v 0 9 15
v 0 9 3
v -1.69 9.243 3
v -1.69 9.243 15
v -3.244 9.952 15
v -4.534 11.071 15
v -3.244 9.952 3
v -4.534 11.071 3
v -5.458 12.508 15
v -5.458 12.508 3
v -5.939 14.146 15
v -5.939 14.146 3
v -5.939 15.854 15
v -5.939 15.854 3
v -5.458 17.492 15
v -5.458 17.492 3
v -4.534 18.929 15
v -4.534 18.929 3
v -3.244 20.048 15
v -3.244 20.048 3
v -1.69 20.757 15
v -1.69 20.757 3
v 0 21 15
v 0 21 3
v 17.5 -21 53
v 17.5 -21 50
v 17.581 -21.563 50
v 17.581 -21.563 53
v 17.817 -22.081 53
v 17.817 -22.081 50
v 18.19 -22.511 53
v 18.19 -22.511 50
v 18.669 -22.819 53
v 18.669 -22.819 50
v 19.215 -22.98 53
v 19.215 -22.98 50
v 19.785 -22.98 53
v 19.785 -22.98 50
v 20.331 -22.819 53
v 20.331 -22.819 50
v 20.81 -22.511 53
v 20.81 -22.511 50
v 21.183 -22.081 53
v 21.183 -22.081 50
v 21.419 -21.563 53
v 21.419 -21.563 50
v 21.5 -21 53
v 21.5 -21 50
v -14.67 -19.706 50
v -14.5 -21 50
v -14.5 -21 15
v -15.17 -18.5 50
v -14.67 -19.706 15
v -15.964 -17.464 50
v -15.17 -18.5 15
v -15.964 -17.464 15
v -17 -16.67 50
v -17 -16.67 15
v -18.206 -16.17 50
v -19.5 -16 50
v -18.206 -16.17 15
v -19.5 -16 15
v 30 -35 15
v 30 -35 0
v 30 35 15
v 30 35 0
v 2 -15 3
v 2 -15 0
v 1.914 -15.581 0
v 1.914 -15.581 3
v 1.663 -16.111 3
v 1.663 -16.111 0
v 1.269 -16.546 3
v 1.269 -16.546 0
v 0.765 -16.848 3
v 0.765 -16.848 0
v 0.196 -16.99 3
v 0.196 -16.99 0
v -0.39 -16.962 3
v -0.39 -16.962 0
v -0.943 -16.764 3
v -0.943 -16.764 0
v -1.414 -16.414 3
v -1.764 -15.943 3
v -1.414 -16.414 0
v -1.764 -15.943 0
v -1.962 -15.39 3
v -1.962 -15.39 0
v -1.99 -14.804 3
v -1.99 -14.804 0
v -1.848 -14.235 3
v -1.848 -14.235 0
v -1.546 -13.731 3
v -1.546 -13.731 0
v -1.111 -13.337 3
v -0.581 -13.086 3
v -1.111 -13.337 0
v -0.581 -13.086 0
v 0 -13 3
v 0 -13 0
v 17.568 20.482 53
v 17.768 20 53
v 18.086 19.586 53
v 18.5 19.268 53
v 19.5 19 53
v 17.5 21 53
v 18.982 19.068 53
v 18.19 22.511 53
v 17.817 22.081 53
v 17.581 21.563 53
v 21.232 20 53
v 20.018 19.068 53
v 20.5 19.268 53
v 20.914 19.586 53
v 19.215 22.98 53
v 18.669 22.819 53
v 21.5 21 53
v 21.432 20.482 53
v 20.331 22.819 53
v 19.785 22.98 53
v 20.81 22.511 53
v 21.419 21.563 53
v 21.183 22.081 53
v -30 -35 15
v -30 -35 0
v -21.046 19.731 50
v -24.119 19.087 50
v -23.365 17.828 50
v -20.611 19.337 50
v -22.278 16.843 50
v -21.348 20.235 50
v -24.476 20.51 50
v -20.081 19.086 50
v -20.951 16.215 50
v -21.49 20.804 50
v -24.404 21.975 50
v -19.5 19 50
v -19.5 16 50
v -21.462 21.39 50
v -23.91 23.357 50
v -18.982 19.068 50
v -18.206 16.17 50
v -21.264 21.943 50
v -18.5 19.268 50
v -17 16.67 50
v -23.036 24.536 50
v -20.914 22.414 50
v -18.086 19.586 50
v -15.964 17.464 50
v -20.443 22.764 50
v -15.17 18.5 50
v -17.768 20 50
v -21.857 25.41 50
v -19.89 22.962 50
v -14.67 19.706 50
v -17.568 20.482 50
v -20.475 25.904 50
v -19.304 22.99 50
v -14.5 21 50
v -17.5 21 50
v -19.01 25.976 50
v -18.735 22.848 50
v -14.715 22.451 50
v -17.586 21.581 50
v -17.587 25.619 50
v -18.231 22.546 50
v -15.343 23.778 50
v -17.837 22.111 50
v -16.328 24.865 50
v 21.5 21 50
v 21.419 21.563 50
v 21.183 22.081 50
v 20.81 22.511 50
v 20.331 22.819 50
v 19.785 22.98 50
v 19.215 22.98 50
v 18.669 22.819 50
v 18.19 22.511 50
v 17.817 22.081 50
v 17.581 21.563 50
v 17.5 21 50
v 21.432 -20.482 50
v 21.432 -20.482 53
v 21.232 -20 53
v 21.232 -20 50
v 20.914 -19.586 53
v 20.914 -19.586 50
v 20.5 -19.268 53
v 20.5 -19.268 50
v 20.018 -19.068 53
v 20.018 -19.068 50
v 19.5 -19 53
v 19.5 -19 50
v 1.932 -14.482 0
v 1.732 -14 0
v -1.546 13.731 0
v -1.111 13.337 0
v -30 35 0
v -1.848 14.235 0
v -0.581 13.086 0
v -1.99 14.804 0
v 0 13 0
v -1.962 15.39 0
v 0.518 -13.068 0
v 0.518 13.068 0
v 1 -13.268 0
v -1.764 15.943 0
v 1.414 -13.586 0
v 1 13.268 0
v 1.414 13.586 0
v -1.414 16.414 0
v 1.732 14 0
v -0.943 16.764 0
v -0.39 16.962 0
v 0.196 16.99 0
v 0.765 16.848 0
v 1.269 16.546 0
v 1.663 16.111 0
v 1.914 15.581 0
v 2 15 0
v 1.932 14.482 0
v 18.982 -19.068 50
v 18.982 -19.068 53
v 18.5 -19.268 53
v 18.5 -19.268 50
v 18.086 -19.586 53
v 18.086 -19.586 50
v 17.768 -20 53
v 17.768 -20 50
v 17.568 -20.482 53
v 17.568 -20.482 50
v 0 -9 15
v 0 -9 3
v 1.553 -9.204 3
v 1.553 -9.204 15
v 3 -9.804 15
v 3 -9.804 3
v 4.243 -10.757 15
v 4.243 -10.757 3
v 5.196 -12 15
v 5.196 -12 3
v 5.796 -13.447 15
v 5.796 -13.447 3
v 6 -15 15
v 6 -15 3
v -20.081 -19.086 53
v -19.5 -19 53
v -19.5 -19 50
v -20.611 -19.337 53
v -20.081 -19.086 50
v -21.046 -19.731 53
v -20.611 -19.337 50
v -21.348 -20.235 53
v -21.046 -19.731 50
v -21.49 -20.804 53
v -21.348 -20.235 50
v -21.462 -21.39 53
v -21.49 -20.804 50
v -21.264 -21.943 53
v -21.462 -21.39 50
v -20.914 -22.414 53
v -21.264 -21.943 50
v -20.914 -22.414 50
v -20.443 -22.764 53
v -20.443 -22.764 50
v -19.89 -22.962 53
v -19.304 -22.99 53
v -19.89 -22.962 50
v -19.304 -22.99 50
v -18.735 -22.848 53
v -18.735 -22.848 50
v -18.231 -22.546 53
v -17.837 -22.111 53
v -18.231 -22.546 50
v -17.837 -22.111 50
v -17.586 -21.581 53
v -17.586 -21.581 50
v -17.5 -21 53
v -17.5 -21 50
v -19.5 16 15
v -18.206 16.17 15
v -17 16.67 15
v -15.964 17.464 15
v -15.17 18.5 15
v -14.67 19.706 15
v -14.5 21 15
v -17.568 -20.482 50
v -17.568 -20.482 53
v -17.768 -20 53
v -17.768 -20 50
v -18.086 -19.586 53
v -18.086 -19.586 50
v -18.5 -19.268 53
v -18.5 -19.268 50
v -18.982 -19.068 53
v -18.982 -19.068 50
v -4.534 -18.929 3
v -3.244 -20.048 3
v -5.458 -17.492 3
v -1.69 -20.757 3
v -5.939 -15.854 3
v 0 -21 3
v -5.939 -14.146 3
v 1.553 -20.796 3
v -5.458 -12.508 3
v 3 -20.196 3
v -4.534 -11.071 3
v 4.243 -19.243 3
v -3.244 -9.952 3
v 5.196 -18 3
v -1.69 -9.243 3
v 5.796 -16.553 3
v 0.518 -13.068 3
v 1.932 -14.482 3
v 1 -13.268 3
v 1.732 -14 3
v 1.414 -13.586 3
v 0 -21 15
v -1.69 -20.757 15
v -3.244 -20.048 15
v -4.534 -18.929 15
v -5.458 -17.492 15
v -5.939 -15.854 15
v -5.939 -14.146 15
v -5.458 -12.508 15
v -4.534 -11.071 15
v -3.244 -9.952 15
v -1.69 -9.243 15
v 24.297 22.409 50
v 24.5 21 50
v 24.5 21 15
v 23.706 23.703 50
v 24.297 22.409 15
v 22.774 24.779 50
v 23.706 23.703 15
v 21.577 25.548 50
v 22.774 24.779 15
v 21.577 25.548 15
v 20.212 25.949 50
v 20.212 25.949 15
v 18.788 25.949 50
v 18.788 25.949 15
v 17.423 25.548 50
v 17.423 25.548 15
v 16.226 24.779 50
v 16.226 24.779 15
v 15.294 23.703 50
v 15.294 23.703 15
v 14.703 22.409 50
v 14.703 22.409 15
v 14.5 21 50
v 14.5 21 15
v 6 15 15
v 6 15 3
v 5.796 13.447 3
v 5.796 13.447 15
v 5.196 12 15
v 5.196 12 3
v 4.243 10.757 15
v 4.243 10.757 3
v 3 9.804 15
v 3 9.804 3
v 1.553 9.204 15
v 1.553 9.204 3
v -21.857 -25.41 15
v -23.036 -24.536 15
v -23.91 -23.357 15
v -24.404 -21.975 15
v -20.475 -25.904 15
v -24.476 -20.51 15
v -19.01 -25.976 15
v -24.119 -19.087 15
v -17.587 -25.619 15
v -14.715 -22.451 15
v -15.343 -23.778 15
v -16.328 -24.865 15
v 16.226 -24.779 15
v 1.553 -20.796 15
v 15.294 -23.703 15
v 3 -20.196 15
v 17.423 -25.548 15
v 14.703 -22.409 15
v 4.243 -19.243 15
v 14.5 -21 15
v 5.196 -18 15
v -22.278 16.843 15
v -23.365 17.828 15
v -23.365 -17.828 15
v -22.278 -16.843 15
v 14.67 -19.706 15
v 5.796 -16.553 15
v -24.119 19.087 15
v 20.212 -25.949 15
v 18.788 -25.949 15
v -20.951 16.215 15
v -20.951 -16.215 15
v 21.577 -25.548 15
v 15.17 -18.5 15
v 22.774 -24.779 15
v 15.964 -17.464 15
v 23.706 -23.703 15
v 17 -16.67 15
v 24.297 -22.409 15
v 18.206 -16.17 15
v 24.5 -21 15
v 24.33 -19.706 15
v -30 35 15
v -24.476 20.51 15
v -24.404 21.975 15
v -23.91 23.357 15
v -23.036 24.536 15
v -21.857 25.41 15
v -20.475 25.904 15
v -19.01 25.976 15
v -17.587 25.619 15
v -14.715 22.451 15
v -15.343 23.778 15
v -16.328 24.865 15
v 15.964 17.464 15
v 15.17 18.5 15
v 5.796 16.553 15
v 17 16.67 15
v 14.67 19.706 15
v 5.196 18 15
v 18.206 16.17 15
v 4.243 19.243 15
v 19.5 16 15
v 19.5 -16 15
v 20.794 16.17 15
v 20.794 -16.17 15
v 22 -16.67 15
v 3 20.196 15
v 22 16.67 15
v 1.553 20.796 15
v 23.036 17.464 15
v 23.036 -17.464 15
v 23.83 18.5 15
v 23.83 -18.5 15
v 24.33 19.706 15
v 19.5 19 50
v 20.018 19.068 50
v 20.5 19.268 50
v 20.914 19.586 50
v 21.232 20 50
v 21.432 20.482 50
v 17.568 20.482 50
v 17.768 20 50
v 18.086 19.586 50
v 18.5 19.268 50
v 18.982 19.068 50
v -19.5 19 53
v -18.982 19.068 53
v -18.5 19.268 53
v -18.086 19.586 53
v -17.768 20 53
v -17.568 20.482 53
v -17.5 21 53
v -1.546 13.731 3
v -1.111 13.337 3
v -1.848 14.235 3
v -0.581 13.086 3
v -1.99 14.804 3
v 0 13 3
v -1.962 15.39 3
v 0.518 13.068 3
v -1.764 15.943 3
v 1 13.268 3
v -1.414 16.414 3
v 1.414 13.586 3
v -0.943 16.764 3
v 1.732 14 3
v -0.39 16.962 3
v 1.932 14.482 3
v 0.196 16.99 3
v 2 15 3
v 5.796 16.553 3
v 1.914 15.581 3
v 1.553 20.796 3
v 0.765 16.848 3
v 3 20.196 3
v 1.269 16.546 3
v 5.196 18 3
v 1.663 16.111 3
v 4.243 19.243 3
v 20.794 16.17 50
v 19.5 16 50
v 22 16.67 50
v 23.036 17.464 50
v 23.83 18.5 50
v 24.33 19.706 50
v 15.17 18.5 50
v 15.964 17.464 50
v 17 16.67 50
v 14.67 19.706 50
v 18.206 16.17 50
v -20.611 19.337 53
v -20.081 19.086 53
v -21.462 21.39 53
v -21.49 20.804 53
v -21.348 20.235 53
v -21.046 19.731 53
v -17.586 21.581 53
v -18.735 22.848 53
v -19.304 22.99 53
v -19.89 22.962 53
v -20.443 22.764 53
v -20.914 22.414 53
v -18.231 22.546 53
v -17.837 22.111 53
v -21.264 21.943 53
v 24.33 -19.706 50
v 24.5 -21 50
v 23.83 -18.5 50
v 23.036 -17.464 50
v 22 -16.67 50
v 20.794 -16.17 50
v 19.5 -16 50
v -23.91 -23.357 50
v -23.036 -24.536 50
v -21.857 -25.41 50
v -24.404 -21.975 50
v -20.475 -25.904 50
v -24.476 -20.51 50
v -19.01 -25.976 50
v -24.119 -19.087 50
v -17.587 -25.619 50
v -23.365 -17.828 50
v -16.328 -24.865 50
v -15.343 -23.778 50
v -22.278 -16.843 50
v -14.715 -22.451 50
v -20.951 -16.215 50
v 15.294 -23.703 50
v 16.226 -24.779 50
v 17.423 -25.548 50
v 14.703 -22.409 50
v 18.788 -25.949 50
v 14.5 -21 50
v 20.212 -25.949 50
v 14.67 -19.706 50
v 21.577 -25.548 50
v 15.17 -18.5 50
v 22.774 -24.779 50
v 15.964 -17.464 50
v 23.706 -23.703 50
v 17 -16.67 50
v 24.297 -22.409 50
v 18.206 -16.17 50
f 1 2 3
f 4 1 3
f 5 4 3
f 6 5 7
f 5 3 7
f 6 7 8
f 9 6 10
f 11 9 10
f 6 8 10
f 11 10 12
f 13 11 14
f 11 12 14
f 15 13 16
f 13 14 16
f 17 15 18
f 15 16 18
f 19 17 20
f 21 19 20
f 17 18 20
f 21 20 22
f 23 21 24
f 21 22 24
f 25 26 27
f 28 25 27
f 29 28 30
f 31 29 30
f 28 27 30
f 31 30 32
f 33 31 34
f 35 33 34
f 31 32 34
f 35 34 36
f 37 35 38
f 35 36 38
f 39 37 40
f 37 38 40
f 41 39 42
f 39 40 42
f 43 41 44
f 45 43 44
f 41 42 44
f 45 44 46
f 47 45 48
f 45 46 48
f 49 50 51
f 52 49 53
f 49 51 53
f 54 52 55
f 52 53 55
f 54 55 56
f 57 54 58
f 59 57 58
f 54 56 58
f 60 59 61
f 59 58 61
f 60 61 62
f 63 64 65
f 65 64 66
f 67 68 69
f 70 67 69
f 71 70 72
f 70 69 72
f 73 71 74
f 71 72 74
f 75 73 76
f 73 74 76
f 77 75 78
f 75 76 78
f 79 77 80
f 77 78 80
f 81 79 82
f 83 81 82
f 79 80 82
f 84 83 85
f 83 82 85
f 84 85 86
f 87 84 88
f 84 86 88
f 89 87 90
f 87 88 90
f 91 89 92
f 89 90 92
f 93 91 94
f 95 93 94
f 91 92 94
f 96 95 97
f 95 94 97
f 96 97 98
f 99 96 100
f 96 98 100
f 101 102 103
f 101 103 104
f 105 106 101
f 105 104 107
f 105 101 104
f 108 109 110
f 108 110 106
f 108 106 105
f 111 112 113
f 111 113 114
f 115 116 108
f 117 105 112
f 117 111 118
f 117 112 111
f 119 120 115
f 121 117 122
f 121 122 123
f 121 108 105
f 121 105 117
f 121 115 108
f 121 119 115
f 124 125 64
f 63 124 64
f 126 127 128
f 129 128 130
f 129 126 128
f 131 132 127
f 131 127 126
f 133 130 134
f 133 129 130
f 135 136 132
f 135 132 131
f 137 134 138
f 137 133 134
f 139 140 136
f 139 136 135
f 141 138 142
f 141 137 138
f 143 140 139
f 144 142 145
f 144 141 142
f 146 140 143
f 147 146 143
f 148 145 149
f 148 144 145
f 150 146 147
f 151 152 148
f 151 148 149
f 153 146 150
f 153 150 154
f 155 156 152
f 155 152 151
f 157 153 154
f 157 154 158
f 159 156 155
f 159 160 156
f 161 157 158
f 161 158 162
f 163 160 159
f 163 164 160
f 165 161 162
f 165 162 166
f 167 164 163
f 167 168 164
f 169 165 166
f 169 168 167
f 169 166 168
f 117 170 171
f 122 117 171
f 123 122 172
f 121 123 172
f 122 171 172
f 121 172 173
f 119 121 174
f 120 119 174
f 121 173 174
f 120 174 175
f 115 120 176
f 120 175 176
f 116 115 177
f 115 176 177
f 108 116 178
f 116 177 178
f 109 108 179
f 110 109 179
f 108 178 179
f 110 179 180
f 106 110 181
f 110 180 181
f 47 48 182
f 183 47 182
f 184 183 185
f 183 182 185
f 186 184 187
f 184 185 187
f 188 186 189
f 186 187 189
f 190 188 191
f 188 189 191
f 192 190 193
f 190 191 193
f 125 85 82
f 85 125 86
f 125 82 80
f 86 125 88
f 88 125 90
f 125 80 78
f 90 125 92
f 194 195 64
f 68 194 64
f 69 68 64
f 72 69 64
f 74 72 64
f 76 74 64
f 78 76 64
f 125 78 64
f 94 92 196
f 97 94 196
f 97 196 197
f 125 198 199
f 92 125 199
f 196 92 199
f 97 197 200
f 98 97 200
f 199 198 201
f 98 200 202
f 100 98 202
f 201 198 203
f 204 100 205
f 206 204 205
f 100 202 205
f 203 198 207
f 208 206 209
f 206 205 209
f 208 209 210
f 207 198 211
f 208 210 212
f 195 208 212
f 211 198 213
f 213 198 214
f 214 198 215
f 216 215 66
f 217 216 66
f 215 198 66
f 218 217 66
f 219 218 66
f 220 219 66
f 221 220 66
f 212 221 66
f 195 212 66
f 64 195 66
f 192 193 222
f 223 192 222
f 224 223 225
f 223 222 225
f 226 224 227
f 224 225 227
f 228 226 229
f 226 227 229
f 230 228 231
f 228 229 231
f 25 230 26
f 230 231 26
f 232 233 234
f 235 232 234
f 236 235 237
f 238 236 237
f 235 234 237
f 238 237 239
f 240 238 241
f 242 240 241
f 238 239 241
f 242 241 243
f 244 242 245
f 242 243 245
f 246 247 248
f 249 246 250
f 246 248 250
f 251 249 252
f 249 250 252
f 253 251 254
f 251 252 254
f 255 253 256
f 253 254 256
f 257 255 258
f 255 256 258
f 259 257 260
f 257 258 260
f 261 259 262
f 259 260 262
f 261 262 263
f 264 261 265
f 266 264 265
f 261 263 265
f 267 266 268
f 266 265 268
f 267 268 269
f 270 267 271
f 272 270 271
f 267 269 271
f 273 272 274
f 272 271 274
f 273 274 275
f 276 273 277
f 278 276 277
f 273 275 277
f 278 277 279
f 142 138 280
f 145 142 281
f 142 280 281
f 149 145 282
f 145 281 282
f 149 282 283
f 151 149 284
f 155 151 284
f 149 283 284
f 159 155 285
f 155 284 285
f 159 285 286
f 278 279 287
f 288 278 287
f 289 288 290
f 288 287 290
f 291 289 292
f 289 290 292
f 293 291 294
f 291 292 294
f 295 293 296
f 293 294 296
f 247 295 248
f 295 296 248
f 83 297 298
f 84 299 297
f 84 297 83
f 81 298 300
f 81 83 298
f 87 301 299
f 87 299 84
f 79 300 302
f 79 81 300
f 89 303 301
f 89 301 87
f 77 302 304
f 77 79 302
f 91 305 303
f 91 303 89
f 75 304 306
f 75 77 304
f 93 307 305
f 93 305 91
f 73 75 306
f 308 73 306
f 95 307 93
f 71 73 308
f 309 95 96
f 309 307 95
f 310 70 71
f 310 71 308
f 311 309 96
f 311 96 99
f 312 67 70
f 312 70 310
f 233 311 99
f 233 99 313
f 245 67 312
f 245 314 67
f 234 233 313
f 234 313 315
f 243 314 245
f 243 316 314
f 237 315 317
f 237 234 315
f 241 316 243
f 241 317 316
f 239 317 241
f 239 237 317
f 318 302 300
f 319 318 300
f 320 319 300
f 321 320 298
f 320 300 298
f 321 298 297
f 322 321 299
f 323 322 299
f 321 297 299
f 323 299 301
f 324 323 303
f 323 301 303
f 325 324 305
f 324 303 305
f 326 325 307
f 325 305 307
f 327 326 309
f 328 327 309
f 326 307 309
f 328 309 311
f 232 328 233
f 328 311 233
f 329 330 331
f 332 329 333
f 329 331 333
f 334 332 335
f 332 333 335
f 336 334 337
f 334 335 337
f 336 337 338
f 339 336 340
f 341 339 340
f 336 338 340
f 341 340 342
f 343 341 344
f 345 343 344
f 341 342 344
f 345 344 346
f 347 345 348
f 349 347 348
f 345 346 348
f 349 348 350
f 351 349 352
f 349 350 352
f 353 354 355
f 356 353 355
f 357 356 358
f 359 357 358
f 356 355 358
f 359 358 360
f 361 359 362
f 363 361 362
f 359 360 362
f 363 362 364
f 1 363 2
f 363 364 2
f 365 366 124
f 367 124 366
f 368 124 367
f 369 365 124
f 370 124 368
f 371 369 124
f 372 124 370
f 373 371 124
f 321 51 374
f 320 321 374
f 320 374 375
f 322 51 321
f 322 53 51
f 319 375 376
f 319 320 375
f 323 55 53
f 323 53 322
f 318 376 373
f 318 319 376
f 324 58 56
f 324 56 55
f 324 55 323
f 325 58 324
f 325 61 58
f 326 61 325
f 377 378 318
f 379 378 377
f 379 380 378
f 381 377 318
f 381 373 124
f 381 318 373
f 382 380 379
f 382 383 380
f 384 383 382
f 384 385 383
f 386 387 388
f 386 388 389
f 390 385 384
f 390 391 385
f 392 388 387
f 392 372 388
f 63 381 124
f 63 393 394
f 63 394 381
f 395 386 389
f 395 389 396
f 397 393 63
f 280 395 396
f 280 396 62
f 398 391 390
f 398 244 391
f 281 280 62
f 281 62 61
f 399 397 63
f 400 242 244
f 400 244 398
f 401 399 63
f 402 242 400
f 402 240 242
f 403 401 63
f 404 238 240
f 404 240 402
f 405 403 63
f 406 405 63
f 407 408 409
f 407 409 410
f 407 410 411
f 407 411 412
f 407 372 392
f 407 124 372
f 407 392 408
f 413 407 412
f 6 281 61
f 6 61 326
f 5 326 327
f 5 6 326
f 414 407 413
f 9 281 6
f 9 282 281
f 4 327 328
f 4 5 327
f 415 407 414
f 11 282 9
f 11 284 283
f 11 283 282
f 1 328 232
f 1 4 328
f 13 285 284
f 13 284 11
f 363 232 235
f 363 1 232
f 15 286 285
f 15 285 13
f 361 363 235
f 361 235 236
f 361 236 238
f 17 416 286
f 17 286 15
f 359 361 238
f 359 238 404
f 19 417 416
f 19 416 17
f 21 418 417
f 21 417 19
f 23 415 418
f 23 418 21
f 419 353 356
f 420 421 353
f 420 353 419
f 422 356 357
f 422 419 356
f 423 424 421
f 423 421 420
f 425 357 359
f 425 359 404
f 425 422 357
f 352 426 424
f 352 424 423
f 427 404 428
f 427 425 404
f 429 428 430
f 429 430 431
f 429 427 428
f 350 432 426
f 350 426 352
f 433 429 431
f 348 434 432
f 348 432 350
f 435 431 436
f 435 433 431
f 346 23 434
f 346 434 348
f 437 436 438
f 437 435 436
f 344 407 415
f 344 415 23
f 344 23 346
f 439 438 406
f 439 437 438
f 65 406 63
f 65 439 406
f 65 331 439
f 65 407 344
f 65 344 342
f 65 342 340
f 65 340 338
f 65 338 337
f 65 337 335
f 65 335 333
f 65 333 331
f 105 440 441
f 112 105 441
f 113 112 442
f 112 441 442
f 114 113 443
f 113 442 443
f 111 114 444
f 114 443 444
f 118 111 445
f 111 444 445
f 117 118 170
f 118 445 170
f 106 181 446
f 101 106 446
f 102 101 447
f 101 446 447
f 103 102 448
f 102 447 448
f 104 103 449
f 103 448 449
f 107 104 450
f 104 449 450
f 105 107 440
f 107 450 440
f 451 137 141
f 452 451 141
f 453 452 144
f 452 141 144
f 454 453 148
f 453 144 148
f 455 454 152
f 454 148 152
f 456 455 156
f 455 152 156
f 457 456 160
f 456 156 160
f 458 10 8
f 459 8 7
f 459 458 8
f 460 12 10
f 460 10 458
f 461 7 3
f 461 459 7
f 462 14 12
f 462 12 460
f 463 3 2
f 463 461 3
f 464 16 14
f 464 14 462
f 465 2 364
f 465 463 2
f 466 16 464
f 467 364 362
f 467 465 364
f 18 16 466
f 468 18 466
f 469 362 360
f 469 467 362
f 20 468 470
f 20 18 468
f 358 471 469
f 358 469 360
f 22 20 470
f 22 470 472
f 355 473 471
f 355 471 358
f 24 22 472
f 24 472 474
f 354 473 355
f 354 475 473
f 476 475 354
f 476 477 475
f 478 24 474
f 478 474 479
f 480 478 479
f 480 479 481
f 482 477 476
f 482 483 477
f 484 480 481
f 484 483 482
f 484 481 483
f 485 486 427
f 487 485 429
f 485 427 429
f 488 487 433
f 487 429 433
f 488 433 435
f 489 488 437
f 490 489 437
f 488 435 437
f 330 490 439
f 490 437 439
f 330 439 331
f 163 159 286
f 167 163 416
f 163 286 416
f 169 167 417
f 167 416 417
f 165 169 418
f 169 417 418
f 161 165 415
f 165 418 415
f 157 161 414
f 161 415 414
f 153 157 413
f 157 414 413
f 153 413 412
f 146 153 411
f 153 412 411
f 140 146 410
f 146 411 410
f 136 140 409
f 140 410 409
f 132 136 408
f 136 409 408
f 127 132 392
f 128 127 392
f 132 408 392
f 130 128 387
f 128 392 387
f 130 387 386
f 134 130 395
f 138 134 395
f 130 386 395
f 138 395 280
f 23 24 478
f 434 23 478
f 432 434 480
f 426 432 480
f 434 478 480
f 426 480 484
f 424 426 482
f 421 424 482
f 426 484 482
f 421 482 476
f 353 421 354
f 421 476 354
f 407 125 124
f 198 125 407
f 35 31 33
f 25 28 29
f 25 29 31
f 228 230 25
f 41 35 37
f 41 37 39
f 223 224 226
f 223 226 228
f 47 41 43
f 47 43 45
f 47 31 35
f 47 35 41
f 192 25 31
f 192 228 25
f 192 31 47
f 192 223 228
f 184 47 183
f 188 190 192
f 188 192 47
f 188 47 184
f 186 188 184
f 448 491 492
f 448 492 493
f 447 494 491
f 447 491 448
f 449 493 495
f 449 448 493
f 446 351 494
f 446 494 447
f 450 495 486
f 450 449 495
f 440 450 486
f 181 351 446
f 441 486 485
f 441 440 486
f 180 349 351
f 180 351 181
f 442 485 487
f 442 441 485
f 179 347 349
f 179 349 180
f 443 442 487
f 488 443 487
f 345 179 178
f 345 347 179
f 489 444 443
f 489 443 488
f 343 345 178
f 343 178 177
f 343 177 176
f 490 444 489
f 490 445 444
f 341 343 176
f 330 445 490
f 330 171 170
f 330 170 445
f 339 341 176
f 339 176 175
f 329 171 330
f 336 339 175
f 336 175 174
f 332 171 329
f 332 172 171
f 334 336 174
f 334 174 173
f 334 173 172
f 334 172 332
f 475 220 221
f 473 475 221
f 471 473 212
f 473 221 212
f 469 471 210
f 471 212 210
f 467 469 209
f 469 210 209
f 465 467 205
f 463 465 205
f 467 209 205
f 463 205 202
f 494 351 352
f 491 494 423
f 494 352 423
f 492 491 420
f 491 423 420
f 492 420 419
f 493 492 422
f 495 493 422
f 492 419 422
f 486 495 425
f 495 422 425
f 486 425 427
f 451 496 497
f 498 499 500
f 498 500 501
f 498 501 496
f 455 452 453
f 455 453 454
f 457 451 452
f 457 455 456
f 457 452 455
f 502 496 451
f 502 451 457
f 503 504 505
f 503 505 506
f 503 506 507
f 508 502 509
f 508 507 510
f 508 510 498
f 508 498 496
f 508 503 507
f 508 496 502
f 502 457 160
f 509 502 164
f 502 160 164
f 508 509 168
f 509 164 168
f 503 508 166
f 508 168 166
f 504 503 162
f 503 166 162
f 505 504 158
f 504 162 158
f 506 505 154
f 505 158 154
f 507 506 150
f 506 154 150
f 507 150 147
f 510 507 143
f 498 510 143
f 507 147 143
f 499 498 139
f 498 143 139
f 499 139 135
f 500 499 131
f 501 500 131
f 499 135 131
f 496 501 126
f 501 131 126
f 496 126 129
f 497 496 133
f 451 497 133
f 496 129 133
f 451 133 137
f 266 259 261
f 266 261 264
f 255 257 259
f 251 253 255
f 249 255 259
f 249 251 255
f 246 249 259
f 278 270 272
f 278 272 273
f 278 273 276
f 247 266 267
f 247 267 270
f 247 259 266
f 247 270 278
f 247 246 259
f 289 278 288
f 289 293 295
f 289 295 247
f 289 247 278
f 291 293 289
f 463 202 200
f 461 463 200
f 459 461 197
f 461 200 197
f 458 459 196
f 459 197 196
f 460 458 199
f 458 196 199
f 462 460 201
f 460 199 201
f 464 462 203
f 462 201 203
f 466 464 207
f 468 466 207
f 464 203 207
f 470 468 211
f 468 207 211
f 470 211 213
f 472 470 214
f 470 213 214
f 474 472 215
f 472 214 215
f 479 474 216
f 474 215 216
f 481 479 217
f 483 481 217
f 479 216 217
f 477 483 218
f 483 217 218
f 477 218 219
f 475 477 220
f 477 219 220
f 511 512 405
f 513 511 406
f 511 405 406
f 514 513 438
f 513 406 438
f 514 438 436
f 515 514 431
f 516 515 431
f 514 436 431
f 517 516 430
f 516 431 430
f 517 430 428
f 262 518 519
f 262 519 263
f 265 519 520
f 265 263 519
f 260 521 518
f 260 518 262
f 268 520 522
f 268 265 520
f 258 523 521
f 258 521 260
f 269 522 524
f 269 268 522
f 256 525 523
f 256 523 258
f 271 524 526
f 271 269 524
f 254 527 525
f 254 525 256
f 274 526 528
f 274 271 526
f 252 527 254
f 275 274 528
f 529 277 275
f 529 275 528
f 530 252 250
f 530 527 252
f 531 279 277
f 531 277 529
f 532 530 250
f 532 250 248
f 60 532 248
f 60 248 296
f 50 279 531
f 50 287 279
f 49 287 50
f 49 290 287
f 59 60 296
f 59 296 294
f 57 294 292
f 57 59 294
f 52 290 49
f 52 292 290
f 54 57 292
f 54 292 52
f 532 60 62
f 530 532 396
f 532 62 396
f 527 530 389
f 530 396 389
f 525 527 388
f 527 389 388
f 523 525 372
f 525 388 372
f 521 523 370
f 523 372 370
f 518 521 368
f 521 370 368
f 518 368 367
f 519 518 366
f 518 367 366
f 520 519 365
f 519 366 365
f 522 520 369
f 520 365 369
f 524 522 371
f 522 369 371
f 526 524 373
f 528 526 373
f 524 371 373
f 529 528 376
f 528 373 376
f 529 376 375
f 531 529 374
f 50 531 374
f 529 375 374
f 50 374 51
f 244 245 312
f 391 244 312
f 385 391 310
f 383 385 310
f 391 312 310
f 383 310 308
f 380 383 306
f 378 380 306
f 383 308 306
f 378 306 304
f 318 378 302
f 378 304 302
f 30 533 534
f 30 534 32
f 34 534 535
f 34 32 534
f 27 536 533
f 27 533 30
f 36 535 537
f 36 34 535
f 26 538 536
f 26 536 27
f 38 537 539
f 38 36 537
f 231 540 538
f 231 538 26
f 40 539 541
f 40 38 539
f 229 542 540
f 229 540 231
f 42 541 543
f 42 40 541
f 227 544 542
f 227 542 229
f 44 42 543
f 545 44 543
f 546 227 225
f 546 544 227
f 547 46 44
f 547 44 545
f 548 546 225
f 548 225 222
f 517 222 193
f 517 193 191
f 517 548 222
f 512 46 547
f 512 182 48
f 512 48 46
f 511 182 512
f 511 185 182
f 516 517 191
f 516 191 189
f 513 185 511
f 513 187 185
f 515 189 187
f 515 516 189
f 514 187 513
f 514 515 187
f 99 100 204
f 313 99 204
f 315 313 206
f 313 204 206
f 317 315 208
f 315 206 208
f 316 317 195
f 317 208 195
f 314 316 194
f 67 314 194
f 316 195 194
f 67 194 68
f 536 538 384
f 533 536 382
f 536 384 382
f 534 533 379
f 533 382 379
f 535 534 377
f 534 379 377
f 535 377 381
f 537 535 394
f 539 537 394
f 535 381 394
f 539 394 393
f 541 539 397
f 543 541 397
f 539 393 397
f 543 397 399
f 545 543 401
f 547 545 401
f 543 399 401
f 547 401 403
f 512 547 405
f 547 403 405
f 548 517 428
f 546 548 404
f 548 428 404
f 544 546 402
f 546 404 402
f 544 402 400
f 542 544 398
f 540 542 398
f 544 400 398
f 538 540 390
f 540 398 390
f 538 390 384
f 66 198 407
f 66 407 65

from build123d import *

# Parameters (mm, degrees)
F0_W     = 60
F0_H     = 70
F1_DEPTH = 15
F2_DEPTH = 50
F3_DEPTH = 53
F4_DEPTH = 3


with BuildPart() as f1:
    # F0 (on Top) → F1 (new body)
    with BuildSketch(Plane.XY):
        Rectangle(F0_W, F0_H)
        with BuildLine():
            Line((0, 21), (14.5, 21))
            ThreePointArc((14.5, 21), (19.5, 26), (24.5, 21))
            ThreePointArc((24.5, 21), (23.0355339059, 17.4644660941), (19.5, 16))
            Line((19.5, 16), (19.5, 0))
            Line((19.5, 0), (19.5, -16))
            ThreePointArc((19.5, -16), (23.0355339059, -17.4644660941), (24.5, -21))
            ThreePointArc((24.5, -21), (19.5, -26), (14.5, -21))
            Line((14.5, -21), (0, -21))
            Line((0, -21), (-14.5, -21))
            ThreePointArc((-14.5, -21), (-23.0355339059, -24.5355339059), (-19.5, -16))
            Line((-19.5, -16), (-19.5, 16))
            ThreePointArc((-19.5, 16), (-23.0355339059, 24.5355339059), (-14.5, 21))
            Line((-14.5, 21), (0, 21))
        make_face(mode=Mode.SUBTRACT)
        with BuildLine():
            ThreePointArc((19.5, 16), (15.9644660941, 17.4644660941), (14.5, 21))
            Line((14.5, 21), (0, 21))
            ThreePointArc((0, 21), (4.2426406871, 19.2426406871), (6, 15))
            ThreePointArc((6, 15), (4.2426406871, 10.7573593129), (0, 9))
            Line((0, 9), (0, 0))
            Line((0, 0), (19.5, 0))
            Line((19.5, 0), (19.5, 16))
        make_face()
        with BuildLine():
            ThreePointArc((0, 9), (-6, 15), (0, 21))
            Line((0, 21), (-14.5, 21))
            ThreePointArc((-14.5, 21), (-15.9644660941, 17.4644660941), (-19.5, 16))
            Line((-19.5, 16), (-19.5, -16))
            ThreePointArc((-19.5, -16), (-15.9644660941, -17.4644660941), (-14.5, -21))
            Line((-14.5, -21), (0, -21))
            ThreePointArc((0, -21), (-6, -15), (0, -9))
            Line((0, -9), (0, 0))
            Line((0, 0), (0, 9))
        make_face()
        with BuildLine():
            Line((19.5, -16), (19.5, 0))
            Line((19.5, 0), (0, 0))
            Line((0, 0), (0, -9))
            ThreePointArc((0, -9), (4.2426406871, -10.7573593129), (6, -15))
            ThreePointArc((6, -15), (4.2426406871, -19.2426406871), (0, -21))
            Line((0, -21), (14.5, -21))
            ThreePointArc((14.5, -21), (15.9644660941, -17.4644660941), (19.5, -16))
        make_face()
    extrude(amount=F1_DEPTH)

    # F0 (on Top) → F2 (join)
    with BuildSketch(Plane.XY):
        with BuildLine():
            ThreePointArc((19.5, 19), (18.0857864376, 19.5857864376), (17.5, 21))
            Line((17.5, 21), (14.5, 21))
            ThreePointArc((14.5, 21), (15.9644660941, 17.4644660941), (19.5, 16))
            Line((19.5, 16), (19.5, 19))
        make_face()
        with BuildLine():
            ThreePointArc((17.5, 21), (19.5, 23), (21.5, 21))
            ThreePointArc((21.5, 21), (20.9142135624, 19.5857864376), (19.5, 19))
            Line((19.5, 19), (19.5, 16))
            ThreePointArc((19.5, 16), (23.0355339059, 17.4644660941), (24.5, 21))
            ThreePointArc((24.5, 21), (19.5, 26), (14.5, 21))
            Line((14.5, 21), (17.5, 21))
        make_face()
        with BuildLine():
            Line((-17.5, 21), (-14.5, 21))
            ThreePointArc((-14.5, 21), (-23.0355339059, 24.5355339059), (-19.5, 16))
            Line((-19.5, 16), (-19.5, 19))
            ThreePointArc((-19.5, 19), (-20.9142135624, 22.4142135624), (-17.5, 21))
        make_face()
        with BuildLine():
            ThreePointArc((-19.5, 16), (-15.9644660941, 17.4644660941), (-14.5, 21))
            Line((-14.5, 21), (-17.5, 21))
            ThreePointArc((-17.5, 21), (-18.0857864376, 19.5857864376), (-19.5, 19))
            Line((-19.5, 19), (-19.5, 16))
        make_face()
        with BuildLine():
            ThreePointArc((-14.5, -21), (-15.9644660941, -17.4644660941), (-19.5, -16))
            Line((-19.5, -16), (-19.5, -19))
            ThreePointArc((-19.5, -19), (-18.0857864376, -19.5857864376), (-17.5, -21))
            Line((-17.5, -21), (-14.5, -21))
        make_face()
        with BuildLine():
            Line((-19.5, -19), (-19.5, -16))
            ThreePointArc((-19.5, -16), (-23.0355339059, -24.5355339059), (-14.5, -21))
            Line((-14.5, -21), (-17.5, -21))
            ThreePointArc((-17.5, -21), (-20.9142135624, -22.4142135624), (-19.5, -19))
        make_face()
        with BuildLine():
            Line((19.5, -19), (19.5, -16))
            ThreePointArc((19.5, -16), (15.9644660941, -17.4644660941), (14.5, -21))
            Line((14.5, -21), (17.5, -21))
            ThreePointArc((17.5, -21), (18.0857864376, -19.5857864376), (19.5, -19))
        make_face()
        with BuildLine():
            ThreePointArc((24.5, -21), (23.0355339059, -17.4644660941), (19.5, -16))
            Line((19.5, -16), (19.5, -19))
            ThreePointArc((19.5, -19), (20.9142135624, -19.5857864376), (21.5, -21))
            ThreePointArc((21.5, -21), (19.5, -23), (17.5, -21))
            Line((17.5, -21), (14.5, -21))
            ThreePointArc((14.5, -21), (19.5, -26), (24.5, -21))
        make_face()
    extrude(amount=F2_DEPTH)

    # F0 (on Top) → F3 (join)
    with BuildSketch(Plane.XY):
        with BuildLine():
            ThreePointArc((-17.5, -21), (-18.0857864376, -19.5857864376), (-19.5, -19))
            Line((-19.5, -19), (-19.5, -21))
            Line((-19.5, -21), (-17.5, -21))
        make_face()
        with BuildLine():
            Line((-19.5, -21), (-19.5, -19))
            ThreePointArc((-19.5, -19), (-20.9142135624, -22.4142135624), (-17.5, -21))
            Line((-17.5, -21), (-19.5, -21))
        make_face()
        with BuildLine():
            Line((-19.5, 21), (-17.5, 21))
            ThreePointArc((-17.5, 21), (-20.9142135624, 22.4142135624), (-19.5, 19))
            Line((-19.5, 19), (-19.5, 21))
        make_face()
        with BuildLine():
            ThreePointArc((-19.5, 19), (-18.0857864376, 19.5857864376), (-17.5, 21))
            Line((-17.5, 21), (-19.5, 21))
            Line((-19.5, 21), (-19.5, 19))
        make_face()
        with BuildLine():
            Line((19.5, -21), (19.5, -19))
            ThreePointArc((19.5, -19), (18.0857864376, -19.5857864376), (17.5, -21))
            Line((17.5, -21), (19.5, -21))
        make_face()
        with BuildLine():
            ThreePointArc((21.5, -21), (20.9142135624, -19.5857864376), (19.5, -19))
            Line((19.5, -19), (19.5, -21))
            Line((19.5, -21), (17.5, -21))
            ThreePointArc((17.5, -21), (19.5, -23), (21.5, -21))
        make_face()
        with BuildLine():
            Line((19.5, 21), (17.5, 21))
            ThreePointArc((17.5, 21), (18.0857864376, 19.5857864376), (19.5, 19))
            Line((19.5, 19), (19.5, 21))
        make_face()
        with BuildLine():
            ThreePointArc((19.5, 19), (20.9142135624, 19.5857864376), (21.5, 21))
            ThreePointArc((21.5, 21), (19.5, 23), (17.5, 21))
            Line((17.5, 21), (19.5, 21))
            Line((19.5, 21), (19.5, 19))
        make_face()
    extrude(amount=F3_DEPTH)

    # F0 (on Top) → F4 (join)
    with BuildSketch(Plane.XY):
        with BuildLine():
            ThreePointArc((6, 15), (4.2426406871, 19.2426406871), (0, 21))
            ThreePointArc((0, 21), (-6, 15), (0, 9))
            ThreePointArc((0, 9), (4.2426406871, 10.7573593129), (6, 15))
        make_face()
        with BuildLine():
            ThreePointArc((2, 15), (1.4142135624, 13.5857864376), (0, 13))
            ThreePointArc((0, 13), (-1.4142135624, 16.4142135624), (2, 15))
        make_face(mode=Mode.SUBTRACT)
        with BuildLine():
            ThreePointArc((6, -15), (4.2426406871, -10.7573593129), (0, -9))
            ThreePointArc((0, -9), (-6, -15), (0, -21))
            ThreePointArc((0, -21), (4.2426406871, -19.2426406871), (6, -15))
        make_face()
        with BuildLine():
            ThreePointArc((2, -15), (-1.4142135624, -16.4142135624), (0, -13))
            ThreePointArc((0, -13), (1.4142135624, -13.5857864376), (2, -15))
        make_face(mode=Mode.SUBTRACT)
    extrude(amount=F4_DEPTH)


solid = f1.part
